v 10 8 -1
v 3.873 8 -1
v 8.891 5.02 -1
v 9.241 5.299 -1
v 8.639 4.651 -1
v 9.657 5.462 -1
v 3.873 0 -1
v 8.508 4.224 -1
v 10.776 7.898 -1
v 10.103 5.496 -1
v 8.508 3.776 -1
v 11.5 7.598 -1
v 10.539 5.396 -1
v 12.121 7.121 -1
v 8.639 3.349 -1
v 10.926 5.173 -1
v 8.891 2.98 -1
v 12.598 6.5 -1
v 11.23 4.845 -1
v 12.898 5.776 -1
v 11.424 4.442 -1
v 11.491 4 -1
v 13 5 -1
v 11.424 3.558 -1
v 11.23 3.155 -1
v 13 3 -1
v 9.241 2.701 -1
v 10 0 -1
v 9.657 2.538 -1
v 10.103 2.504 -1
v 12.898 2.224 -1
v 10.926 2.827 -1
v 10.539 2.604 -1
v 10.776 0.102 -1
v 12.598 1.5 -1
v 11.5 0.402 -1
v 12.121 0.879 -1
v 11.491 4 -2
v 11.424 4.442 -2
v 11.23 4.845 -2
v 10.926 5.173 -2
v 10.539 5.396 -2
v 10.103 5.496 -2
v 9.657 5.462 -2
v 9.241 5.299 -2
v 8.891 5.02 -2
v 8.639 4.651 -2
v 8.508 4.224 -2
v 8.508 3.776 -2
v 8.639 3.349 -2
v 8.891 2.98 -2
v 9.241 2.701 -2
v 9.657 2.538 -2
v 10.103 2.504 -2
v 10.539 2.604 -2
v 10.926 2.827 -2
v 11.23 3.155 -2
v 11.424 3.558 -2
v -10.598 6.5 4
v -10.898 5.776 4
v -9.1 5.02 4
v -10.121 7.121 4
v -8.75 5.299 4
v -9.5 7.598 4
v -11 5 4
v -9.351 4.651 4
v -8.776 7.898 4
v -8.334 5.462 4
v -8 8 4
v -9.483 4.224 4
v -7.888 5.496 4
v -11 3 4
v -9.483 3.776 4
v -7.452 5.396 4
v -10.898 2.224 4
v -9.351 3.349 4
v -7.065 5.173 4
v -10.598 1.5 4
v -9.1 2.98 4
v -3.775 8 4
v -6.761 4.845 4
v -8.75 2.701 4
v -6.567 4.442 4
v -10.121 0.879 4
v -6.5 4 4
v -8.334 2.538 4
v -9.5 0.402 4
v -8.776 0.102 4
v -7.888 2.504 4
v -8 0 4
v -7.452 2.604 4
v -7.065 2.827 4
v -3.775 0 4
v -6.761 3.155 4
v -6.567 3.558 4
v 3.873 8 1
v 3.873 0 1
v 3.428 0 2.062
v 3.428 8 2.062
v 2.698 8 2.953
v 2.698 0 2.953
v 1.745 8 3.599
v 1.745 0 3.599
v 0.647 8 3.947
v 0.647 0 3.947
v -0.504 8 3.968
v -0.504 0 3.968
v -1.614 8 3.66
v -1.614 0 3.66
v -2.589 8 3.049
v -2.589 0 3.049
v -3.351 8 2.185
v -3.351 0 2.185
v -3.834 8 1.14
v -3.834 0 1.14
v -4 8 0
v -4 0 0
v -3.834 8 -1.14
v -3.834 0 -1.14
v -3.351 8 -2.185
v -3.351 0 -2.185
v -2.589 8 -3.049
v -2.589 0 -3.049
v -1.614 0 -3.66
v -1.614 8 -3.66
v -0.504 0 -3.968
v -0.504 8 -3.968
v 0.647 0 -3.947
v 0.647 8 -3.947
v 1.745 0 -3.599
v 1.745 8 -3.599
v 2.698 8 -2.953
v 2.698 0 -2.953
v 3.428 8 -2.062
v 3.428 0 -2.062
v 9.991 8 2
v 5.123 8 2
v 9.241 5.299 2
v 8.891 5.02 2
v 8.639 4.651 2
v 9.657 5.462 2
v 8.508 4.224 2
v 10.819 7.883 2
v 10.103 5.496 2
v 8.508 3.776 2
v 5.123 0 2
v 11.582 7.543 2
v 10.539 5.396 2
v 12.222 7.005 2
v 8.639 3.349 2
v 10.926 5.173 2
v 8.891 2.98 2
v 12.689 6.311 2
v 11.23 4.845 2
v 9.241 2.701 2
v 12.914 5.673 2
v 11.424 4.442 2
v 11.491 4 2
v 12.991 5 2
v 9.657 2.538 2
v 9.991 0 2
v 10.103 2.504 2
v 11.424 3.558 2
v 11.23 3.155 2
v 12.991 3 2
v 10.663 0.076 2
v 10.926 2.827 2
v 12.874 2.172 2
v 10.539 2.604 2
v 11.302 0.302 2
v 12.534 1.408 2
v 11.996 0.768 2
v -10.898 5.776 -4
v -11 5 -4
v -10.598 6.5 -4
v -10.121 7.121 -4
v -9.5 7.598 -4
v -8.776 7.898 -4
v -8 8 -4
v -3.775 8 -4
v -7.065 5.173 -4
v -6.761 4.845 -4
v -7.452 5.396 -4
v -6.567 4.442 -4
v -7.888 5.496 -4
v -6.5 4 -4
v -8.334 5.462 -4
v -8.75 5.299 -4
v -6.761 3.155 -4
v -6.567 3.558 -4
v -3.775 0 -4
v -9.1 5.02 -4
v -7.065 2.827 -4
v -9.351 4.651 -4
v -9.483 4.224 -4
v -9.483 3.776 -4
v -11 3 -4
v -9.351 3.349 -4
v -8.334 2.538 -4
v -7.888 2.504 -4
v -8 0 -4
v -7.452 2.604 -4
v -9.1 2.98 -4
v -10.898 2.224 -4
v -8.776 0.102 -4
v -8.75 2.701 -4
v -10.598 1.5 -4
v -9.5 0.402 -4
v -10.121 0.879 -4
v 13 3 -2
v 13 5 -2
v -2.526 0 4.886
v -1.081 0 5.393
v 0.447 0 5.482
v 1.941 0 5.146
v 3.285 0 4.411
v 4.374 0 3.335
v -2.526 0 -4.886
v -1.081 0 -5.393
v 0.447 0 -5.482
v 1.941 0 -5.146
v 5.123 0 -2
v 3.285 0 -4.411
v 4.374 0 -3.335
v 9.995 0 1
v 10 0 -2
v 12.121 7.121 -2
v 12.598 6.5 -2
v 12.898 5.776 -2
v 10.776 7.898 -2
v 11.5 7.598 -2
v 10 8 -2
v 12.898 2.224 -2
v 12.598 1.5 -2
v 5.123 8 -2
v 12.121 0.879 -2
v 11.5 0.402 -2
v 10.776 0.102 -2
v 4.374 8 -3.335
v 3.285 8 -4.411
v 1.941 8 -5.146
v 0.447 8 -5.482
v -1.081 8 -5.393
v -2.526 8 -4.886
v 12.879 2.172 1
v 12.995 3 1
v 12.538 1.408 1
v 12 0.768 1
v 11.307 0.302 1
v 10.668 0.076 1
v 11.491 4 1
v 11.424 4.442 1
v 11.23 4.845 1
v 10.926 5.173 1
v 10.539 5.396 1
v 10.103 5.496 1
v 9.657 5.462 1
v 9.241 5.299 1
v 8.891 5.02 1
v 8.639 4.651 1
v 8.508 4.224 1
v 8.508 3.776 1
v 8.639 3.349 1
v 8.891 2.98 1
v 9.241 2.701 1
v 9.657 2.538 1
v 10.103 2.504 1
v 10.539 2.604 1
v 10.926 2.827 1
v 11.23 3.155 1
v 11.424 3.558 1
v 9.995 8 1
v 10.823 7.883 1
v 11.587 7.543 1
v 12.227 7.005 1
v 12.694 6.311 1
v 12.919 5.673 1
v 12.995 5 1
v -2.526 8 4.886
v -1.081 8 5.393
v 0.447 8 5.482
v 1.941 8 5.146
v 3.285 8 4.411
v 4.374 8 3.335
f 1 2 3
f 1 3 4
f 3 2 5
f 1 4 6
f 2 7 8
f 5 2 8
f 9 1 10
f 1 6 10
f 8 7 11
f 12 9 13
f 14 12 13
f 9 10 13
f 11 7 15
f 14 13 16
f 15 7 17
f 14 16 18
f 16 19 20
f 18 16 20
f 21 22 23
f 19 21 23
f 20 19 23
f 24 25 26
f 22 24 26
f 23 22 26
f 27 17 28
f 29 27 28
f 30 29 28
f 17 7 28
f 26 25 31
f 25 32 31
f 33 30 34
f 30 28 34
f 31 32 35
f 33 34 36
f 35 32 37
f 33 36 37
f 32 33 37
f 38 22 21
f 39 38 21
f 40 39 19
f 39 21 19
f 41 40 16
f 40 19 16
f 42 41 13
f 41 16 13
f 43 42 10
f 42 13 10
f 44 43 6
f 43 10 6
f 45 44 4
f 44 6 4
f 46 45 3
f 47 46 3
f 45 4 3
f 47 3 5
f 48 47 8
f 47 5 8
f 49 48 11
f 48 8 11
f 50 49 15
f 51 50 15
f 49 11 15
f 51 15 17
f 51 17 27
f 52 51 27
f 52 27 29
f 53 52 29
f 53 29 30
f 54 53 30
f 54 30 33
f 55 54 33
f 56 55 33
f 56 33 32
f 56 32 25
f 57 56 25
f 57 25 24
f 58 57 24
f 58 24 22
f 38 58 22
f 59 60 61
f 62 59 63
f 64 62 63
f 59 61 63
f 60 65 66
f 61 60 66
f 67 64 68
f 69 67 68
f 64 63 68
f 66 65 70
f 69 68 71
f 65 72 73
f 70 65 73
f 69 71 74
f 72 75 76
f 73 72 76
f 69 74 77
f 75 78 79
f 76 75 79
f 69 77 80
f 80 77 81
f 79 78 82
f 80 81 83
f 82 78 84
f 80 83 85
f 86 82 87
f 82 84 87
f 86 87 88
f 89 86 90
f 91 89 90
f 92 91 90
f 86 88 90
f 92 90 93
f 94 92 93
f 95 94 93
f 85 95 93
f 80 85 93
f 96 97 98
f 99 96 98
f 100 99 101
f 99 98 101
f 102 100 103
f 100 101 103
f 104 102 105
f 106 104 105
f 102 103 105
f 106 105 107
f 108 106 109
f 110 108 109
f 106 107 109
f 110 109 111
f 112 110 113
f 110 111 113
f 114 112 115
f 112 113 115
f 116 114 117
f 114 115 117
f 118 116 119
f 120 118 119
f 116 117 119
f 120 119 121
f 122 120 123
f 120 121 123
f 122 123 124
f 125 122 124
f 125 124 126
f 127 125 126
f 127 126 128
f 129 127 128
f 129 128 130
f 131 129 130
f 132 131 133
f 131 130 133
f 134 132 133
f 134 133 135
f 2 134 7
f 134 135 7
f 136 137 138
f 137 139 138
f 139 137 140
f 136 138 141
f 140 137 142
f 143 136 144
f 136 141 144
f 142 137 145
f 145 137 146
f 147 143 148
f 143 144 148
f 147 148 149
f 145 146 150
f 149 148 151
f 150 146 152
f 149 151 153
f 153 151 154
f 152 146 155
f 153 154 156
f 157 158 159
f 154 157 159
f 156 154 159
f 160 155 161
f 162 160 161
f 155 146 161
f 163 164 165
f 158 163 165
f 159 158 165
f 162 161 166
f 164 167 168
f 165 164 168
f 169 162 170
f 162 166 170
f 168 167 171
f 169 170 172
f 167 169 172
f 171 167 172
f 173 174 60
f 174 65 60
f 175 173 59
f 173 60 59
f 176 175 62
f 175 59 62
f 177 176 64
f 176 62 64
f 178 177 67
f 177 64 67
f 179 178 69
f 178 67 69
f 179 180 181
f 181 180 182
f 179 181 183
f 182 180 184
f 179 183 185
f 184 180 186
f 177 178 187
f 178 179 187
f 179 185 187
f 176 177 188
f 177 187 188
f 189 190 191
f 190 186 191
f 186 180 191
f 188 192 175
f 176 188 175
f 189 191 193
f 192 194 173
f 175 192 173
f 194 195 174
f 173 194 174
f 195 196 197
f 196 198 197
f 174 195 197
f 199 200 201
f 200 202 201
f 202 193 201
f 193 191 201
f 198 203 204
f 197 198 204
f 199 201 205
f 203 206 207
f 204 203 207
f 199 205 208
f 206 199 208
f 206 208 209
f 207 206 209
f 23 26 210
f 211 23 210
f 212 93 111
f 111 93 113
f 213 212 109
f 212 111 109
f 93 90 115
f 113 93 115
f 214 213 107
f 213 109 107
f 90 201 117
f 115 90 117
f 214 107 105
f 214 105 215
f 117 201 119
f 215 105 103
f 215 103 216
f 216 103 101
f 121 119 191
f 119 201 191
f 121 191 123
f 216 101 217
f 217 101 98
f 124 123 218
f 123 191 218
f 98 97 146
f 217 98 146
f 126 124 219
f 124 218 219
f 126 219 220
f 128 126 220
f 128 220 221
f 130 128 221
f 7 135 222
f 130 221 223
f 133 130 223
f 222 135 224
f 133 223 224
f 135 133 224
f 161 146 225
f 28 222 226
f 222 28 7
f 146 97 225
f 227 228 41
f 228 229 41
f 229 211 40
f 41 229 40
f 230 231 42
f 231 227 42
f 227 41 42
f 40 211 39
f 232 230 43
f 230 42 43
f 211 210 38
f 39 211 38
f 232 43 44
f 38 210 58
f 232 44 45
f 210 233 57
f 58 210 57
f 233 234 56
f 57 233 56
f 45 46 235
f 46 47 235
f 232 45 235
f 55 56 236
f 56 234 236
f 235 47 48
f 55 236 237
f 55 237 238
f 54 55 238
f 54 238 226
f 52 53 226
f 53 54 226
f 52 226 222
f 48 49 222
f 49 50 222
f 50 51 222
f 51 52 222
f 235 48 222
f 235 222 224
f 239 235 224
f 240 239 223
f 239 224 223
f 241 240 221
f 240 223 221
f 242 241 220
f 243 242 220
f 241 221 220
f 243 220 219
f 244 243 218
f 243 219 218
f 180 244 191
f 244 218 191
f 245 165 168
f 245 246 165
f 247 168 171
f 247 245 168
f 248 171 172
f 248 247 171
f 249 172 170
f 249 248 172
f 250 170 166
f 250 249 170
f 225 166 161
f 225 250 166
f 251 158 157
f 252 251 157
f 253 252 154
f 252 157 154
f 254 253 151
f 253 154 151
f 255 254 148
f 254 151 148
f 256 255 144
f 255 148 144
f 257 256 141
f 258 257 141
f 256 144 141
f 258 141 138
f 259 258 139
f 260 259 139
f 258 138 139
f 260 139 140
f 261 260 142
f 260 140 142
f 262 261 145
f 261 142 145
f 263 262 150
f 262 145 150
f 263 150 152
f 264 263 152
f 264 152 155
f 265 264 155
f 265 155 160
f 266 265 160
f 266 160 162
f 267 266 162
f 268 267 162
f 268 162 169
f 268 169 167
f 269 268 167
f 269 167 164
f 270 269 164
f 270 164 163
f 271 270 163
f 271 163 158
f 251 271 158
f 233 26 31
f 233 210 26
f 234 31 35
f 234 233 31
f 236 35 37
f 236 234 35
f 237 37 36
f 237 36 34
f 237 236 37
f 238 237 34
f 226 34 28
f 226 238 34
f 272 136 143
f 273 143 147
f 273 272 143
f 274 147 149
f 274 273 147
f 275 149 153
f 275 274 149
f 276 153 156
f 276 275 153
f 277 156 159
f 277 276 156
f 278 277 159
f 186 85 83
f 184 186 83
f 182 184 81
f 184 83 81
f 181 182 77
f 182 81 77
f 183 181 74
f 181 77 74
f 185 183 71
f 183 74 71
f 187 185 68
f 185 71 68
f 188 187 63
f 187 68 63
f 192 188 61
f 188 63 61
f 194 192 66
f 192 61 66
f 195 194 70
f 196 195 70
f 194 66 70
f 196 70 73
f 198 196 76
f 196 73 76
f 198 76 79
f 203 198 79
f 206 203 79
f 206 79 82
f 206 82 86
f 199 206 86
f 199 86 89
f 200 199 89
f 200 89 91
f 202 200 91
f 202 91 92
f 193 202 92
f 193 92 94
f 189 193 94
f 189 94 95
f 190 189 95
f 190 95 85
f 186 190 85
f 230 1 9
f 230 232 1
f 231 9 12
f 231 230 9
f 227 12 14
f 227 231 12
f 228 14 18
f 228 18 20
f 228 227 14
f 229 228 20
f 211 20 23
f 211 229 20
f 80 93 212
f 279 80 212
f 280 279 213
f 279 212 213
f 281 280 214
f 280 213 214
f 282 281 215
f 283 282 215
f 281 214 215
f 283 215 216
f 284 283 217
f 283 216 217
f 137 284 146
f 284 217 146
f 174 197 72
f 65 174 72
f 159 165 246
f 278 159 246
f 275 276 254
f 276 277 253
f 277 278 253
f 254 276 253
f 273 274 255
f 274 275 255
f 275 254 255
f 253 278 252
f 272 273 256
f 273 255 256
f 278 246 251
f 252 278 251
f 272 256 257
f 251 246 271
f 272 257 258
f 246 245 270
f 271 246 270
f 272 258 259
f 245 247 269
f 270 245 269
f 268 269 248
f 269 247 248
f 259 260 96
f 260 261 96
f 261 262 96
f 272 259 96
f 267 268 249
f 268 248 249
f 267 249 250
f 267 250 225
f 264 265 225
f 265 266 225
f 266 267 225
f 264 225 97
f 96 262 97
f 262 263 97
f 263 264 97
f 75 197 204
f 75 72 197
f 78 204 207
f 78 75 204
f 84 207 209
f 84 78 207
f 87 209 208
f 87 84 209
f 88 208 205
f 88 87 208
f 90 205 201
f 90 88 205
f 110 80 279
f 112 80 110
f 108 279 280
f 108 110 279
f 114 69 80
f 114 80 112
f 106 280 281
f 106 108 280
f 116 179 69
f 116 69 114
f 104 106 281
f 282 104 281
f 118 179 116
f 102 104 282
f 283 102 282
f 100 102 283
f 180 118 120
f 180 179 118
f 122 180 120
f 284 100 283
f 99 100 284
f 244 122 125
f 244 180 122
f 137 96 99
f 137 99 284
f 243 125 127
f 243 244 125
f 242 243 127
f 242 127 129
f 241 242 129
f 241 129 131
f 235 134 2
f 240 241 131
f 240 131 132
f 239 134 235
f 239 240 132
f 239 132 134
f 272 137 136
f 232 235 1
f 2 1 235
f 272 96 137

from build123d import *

# Parameters (mm, degrees)
EXTRUDE_1_DEPTH     = 8
FILLET_2_R          = 3
FILLET_3_R          = 3
FILLET_4_R          = 3
FILLET_5_R          = 3
FILLET_6_R          = 3
FILLET_7_R          = 3
SKETCH_3_R          = 1.5
CUT_EXTRUDE_1_DEPTH = 20
SKETCH_4_R          = 1.5
CUT_EXTRUDE_2_DEPTH = 20


with BuildPart() as part:
    # 草图1 → 凸台-拉伸1 (new body)
    with BuildSketch(Plane(origin=(0, 0, 0), x_dir=(1, 0, 0), z_dir=(0, 1, 0))):
        with BuildLine():
            Line((8.935144768, 1), (13, 1))
            Line((13, 1), (13, 2))
            Line((13, 2), (5.123475383, 2))
            ThreePointArc((5.123475383, 2), (1.206089666, 5.366129678), (-3.774917218, 4))
            Line((-3.774917218, 4), (-11, 4))
            Line((-11, 4), (-11, -4))
            Line((-11, -4), (-3.774917218, -4))
            ThreePointArc((-3.774917218, -4), (1.206089666, -5.366129678), (5.123475383, -2))
            Line((5.123475383, -2), (12.990817457, -2))
            Line((12.990817457, -2), (12.995479361, -1))
            Line((12.995479361, -1), (5.408326913, -1))
            Line((5.408326913, -1), (3.872983346, -1))
            ThreePointArc((3.872983346, -1), (-4, 0), (3.872983346, 1))
            Line((3.872983346, 1), (8.935144768, 1))
        make_face()
    extrude(amount=EXTRUDE_1_DEPTH)

    # 圆角2
    fillet_2_edges = [part.edges().sort_by_distance(p)[0] for p in [
        (-11, 8, 0),
    ]]
    fillet(fillet_2_edges, radius=FILLET_2_R)

    # 圆角3
    fillet_3_edges = [part.edges().sort_by_distance(p)[0] for p in [
        (-11, 0, 0),
    ]]
    fillet(fillet_3_edges, radius=FILLET_3_R)

    # 圆角4
    fillet_4_edges = [part.edges().sort_by_distance(p)[0] for p in [
        (12.993148409, 8, 1.5),
    ]]
    fillet(fillet_4_edges, radius=FILLET_4_R)

    # 圆角5
    fillet_5_edges = [part.edges().sort_by_distance(p)[0] for p in [
        (12.993148409, 0, 1.5),
    ]]
    fillet(fillet_5_edges, radius=FILLET_5_R)

    # 圆角6
    fillet_6_edges = [part.edges().sort_by_distance(p)[0] for p in [
        (13, 8, -1.5),
    ]]
    fillet(fillet_6_edges, radius=FILLET_6_R)

    # 圆角7
    fillet_7_edges = [part.edges().sort_by_distance(p)[0] for p in [
        (13, 0, -1.5),
    ]]
    fillet(fillet_7_edges, radius=FILLET_7_R)

    # 草图3 → 切除-拉伸1 (cut)
    with BuildSketch(Plane.XY.offset(4)):
        with Locations((-8, 4)):
            Circle(SKETCH_3_R)
    extrude(amount=-CUT_EXTRUDE_1_DEPTH, mode=Mode.SUBTRACT)

    # 草图4 → 切除-拉伸2 (cut)
    with BuildSketch(Plane.XY.offset(2)):
        with Locations((9.990817457, 4)):
            Circle(SKETCH_4_R)
    extrude(amount=-CUT_EXTRUDE_2_DEPTH, mode=Mode.SUBTRACT)


solid = part.part
